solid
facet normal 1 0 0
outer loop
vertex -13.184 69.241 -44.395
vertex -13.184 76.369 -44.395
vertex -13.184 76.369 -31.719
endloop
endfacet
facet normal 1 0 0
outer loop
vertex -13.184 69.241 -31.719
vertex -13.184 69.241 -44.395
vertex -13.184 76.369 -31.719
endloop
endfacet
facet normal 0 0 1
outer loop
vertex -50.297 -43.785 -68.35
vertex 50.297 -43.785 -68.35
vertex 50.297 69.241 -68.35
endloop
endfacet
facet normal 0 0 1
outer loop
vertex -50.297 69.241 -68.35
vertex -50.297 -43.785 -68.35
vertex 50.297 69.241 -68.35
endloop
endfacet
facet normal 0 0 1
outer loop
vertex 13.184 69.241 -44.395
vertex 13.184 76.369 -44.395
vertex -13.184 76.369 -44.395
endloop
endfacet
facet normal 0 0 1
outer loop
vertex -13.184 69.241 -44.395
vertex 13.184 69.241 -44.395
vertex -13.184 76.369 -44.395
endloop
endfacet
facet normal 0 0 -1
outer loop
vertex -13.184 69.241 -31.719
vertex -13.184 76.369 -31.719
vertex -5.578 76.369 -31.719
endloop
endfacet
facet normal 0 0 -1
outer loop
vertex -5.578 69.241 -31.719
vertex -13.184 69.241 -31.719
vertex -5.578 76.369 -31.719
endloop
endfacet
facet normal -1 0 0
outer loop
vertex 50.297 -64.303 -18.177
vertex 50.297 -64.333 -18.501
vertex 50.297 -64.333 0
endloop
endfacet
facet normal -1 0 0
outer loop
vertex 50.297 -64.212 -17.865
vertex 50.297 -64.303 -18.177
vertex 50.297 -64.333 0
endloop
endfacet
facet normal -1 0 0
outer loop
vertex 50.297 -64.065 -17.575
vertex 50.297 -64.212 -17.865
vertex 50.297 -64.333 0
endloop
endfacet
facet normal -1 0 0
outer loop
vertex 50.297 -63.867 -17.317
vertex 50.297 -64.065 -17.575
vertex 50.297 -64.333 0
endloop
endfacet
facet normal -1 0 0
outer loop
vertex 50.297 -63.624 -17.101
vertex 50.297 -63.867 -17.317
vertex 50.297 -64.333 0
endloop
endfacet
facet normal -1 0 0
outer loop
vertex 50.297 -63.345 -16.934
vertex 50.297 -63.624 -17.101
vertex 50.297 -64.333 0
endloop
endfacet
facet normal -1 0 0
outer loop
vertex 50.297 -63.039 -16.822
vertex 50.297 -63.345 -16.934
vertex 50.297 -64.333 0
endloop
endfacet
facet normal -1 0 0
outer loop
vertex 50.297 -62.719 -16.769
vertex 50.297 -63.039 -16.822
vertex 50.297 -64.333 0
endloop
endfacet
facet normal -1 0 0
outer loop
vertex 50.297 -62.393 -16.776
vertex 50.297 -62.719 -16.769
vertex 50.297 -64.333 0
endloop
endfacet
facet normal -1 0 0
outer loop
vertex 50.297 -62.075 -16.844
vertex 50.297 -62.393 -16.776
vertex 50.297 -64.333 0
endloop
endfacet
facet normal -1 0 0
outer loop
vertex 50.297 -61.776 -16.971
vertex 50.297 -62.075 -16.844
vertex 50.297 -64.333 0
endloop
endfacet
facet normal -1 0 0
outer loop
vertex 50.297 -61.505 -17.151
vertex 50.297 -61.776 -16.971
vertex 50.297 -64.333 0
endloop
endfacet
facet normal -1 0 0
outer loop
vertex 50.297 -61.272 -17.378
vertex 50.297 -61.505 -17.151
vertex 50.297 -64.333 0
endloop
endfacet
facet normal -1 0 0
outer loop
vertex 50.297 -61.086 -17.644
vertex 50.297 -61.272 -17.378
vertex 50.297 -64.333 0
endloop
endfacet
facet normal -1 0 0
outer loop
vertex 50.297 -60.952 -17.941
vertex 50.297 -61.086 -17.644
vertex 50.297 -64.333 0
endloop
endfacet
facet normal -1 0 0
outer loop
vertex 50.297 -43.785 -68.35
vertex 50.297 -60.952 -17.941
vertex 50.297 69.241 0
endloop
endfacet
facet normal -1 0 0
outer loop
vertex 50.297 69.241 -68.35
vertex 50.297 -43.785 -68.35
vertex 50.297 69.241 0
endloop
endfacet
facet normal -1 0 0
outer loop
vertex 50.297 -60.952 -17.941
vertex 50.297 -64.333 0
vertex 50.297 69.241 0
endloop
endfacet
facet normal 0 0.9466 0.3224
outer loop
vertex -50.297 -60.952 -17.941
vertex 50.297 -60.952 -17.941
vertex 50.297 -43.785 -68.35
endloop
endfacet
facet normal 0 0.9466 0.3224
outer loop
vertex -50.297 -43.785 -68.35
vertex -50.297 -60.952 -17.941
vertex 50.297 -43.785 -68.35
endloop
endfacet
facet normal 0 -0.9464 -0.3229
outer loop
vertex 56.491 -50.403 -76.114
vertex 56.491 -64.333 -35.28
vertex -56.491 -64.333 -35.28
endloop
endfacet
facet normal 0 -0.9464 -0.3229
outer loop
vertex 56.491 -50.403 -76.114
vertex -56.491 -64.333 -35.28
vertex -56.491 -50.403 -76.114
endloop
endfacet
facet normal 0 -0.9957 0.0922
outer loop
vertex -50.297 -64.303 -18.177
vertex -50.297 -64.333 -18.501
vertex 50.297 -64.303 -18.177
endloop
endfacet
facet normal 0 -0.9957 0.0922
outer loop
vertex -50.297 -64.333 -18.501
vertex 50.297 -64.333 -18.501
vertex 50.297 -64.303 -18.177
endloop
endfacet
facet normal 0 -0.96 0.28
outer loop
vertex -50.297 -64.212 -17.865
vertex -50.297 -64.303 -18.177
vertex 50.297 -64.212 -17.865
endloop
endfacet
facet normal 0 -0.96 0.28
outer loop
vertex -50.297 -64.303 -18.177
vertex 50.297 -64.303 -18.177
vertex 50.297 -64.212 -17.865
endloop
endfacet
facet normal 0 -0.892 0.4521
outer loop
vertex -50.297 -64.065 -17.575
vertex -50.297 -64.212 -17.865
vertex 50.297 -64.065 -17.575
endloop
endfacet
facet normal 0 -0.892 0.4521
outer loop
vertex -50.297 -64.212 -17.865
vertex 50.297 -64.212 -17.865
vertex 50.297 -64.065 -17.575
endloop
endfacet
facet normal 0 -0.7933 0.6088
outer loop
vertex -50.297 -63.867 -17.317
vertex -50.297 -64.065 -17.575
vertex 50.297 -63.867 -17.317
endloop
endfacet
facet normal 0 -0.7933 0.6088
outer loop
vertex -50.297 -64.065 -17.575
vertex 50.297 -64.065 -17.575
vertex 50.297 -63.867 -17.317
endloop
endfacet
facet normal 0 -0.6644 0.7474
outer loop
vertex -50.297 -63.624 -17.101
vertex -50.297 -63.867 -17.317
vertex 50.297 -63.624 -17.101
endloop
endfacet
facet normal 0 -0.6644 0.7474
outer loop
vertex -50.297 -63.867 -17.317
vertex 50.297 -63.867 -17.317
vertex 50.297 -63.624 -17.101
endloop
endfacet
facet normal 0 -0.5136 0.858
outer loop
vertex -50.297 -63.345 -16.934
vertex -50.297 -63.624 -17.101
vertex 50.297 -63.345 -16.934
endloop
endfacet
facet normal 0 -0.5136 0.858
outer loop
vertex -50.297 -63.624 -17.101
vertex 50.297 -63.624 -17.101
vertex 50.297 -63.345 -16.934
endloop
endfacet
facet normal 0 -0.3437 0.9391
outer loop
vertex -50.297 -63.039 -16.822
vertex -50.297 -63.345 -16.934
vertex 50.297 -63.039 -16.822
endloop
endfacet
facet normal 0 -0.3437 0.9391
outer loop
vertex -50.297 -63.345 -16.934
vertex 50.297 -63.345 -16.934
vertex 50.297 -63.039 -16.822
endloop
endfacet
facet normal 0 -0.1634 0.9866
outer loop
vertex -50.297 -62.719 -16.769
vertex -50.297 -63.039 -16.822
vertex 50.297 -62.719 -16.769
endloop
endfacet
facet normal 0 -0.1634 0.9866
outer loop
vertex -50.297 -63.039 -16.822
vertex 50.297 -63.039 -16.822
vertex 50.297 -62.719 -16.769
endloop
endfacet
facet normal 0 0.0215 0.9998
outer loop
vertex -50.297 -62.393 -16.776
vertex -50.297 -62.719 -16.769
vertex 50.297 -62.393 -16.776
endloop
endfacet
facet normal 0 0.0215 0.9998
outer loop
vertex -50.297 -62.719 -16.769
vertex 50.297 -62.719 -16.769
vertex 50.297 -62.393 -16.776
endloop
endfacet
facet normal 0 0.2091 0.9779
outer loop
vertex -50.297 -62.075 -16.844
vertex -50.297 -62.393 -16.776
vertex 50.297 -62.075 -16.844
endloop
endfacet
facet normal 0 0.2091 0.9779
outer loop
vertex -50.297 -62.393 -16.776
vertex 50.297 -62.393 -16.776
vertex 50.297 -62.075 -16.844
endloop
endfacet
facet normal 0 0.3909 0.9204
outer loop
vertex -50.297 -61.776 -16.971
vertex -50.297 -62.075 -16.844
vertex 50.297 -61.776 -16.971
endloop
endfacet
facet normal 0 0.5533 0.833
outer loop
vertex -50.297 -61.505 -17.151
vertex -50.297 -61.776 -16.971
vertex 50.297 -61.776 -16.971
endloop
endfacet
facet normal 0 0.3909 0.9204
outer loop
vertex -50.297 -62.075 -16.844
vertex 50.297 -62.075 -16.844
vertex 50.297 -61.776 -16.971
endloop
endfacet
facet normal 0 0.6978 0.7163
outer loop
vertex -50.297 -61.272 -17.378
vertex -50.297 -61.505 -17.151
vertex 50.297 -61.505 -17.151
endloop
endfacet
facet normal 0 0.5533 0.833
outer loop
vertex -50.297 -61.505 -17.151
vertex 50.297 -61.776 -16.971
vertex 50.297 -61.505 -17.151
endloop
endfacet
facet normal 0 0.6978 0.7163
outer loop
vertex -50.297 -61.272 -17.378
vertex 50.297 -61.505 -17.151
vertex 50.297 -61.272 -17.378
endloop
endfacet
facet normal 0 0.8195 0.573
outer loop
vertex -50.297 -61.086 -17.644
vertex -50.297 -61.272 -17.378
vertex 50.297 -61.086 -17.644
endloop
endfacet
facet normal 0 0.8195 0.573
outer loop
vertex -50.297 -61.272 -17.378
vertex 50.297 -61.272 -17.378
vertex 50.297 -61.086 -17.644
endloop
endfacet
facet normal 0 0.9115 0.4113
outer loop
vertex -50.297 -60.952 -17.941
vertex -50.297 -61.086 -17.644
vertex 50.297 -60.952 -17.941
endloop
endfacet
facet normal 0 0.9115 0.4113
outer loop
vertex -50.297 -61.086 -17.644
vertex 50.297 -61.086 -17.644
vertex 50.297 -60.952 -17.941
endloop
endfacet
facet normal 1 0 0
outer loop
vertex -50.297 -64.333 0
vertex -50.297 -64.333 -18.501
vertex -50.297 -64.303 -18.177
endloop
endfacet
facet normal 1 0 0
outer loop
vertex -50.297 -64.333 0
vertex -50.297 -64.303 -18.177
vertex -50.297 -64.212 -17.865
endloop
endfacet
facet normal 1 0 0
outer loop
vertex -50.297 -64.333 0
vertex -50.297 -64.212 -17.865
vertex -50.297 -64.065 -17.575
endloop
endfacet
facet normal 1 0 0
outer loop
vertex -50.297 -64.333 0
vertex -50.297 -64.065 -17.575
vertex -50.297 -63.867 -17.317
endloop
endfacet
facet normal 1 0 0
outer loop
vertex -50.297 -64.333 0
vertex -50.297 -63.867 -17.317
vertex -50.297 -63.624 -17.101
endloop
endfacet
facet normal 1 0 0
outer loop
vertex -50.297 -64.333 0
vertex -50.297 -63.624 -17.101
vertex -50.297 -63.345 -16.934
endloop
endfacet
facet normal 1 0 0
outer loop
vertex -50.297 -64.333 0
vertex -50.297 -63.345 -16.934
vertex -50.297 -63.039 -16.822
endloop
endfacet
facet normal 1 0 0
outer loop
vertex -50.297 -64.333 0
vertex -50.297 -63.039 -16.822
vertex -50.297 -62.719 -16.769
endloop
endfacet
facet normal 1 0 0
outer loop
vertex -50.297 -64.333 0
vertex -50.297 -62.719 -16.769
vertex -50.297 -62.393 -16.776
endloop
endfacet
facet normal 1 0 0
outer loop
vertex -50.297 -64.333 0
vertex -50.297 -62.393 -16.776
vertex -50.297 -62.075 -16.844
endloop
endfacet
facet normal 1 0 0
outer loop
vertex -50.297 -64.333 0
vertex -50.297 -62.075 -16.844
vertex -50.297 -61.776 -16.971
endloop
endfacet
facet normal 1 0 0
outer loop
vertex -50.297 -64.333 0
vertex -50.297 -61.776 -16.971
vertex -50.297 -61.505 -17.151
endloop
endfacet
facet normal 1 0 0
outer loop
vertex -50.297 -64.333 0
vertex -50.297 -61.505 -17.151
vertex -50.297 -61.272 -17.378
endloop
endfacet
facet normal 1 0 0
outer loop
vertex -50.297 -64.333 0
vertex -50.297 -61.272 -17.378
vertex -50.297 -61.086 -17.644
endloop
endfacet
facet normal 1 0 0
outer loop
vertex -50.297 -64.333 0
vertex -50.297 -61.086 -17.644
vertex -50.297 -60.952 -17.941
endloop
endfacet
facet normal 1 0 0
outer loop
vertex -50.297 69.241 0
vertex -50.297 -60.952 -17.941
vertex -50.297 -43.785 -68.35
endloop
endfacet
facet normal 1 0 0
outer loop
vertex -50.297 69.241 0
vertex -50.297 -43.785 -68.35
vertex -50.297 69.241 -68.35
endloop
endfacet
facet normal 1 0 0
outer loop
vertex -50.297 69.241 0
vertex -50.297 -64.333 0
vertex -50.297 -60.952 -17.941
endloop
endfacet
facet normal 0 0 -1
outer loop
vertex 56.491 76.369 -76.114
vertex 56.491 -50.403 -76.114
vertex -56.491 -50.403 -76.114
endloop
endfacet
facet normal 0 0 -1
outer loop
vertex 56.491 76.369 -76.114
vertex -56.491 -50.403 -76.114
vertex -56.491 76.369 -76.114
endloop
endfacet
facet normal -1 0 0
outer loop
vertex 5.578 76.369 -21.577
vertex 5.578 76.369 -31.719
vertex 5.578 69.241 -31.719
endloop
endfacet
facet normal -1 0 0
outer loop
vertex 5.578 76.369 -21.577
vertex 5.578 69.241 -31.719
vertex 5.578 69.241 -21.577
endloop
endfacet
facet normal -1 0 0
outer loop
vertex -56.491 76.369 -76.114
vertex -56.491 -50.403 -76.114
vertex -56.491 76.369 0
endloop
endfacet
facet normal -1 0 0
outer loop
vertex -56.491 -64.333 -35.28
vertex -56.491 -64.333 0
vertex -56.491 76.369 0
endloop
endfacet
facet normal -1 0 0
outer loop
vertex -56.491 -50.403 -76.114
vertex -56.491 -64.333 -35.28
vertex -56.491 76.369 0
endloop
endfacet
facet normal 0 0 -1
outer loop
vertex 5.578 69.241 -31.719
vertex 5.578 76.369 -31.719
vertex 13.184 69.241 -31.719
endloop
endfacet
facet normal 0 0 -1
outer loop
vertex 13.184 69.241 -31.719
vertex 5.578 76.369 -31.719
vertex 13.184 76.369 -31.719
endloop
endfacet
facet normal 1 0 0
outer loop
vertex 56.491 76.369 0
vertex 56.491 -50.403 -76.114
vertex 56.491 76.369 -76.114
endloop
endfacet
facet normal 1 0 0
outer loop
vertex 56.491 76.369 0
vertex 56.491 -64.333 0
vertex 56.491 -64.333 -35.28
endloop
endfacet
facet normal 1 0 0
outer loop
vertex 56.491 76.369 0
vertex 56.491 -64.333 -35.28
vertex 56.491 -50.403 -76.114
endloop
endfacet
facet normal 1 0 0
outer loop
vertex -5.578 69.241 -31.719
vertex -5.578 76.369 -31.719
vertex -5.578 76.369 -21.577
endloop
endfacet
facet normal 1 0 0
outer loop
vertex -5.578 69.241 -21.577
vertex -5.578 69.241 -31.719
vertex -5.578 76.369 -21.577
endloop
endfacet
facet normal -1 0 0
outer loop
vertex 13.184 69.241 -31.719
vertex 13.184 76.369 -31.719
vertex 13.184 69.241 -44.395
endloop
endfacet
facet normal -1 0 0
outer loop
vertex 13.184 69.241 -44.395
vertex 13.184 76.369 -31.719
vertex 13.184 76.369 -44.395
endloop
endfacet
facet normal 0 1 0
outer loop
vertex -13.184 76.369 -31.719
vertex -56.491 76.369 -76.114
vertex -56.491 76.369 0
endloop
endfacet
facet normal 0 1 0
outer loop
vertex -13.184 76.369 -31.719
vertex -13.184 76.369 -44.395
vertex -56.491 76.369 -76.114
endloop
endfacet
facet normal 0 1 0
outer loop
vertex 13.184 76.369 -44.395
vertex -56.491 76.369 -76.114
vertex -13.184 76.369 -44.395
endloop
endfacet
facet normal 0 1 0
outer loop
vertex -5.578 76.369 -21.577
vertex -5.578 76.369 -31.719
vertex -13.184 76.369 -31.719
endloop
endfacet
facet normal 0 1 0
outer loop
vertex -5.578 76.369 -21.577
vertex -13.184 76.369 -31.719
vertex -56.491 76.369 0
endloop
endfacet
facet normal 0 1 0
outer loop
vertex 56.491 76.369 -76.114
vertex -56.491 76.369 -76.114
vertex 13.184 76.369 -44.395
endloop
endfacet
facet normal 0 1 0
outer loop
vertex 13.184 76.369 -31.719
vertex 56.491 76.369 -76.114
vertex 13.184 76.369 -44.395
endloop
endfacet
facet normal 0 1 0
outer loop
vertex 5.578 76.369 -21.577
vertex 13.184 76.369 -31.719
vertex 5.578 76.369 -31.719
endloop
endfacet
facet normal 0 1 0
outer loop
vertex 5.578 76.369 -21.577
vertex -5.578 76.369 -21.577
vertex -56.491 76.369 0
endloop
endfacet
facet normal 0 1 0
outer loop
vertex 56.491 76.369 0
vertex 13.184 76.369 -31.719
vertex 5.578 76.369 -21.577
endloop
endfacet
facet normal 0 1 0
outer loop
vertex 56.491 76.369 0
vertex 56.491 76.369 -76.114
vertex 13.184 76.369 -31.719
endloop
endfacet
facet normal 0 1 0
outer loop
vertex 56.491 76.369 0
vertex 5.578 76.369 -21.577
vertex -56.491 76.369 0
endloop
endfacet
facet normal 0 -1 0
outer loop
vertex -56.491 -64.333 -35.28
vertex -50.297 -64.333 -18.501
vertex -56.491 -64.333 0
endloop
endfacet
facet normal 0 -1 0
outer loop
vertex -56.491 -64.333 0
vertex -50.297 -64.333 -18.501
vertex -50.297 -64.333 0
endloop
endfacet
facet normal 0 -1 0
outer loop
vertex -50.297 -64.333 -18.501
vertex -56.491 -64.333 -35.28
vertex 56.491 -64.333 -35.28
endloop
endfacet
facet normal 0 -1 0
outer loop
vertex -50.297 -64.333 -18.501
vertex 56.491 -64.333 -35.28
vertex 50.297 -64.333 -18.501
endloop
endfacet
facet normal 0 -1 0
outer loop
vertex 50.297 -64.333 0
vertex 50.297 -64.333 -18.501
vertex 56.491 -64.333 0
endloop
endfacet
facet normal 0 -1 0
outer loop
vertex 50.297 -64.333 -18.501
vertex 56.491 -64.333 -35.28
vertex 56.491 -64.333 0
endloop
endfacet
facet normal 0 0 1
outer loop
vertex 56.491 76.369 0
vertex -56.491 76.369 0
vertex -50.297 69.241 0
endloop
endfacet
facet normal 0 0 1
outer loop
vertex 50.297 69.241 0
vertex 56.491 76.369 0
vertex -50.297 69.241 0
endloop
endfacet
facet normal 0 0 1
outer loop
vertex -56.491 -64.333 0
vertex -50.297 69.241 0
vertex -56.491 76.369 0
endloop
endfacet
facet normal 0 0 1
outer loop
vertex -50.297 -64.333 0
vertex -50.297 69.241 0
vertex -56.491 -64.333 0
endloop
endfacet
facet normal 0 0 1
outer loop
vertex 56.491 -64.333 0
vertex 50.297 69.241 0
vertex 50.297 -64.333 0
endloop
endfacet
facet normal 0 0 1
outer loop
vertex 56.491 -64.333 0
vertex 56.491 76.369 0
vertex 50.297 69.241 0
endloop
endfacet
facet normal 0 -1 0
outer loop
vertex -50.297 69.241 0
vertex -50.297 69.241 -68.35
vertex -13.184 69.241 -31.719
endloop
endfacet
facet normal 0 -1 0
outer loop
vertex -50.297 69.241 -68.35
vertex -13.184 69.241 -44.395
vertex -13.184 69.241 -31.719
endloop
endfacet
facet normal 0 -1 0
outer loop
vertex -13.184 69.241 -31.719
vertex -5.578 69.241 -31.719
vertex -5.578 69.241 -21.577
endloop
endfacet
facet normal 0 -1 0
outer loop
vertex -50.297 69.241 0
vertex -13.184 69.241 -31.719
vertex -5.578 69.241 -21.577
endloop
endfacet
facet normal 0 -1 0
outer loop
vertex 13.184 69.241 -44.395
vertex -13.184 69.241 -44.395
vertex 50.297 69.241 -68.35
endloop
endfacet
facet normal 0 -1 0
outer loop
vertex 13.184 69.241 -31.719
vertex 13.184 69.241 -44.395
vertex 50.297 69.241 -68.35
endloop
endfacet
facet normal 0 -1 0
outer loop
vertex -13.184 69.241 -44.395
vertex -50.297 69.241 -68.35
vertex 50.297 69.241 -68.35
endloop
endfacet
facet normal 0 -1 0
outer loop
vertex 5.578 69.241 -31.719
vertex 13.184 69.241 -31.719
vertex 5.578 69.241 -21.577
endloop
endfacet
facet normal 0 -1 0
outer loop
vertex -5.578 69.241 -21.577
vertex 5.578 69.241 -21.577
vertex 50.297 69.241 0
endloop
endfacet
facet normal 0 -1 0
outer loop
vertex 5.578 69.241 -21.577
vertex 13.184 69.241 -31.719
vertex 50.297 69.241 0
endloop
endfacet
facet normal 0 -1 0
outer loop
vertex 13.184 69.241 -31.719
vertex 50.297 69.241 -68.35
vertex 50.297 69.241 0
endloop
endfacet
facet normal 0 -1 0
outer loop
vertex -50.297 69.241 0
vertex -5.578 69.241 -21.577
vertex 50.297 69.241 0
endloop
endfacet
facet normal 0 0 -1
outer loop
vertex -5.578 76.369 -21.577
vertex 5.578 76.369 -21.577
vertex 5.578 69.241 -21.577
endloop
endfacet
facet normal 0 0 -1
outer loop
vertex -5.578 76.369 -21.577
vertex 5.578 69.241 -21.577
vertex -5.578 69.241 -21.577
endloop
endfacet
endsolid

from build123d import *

# Parameters (mm, degrees)
F2_DEPTH  = 56.49083
F3_DEPTH  = 50.29662
F4_W      = 17.6400020719
F4_H      = 34.6500007436
F5_DEPTH  = 152.4
F6_W      = 8.1899985671
F6_H      = 40.634999983
F7_DEPTH  = 152.4
F8_R      = 1.7367288427
F9_W      = 11.1553873867
F9_H      = 10.141255334
F10_DEPTH = 26.2403


with BuildPart() as f2:
    # F0 (on Right) → F2 (new body, symmetric)
    with BuildSketch(Plane.YZ):
        Polygon((76.3685554266, 0), (-76.3685554266, 0), (-50.4032447934, -76.1139914393), (76.3685554266, -76.1139914393), align=None)
    extrude(amount=F2_DEPTH, both=True)

    # F1 (on face) → F3 (cut, symmetric)
    with BuildSketch(Plane.YZ):
        Polygon((69.2408159375, 0), (-67.0627951622, 0), (-43.7846407294, -68.349853158), (69.2408159375, -68.349853158), align=None)
    extrude(amount=F3_DEPTH, both=True, mode=Mode.SUBTRACT)

    # F4 (on Right) → F5 (cut, symmetric)
    with BuildSketch(Plane.YZ):
        with Locations((-75.7574997842, -6.6150003113)):
            Rectangle(F4_W, F4_H)
    extrude(amount=F5_DEPTH, both=True, mode=Mode.SUBTRACT)

    # F6 (on Right) → F7 (cut, symmetric)
    with BuildSketch(Plane.YZ):
        with Locations((-68.42822209, -15.2774997987)):
            Rectangle(F6_W, F6_H)
    extrude(amount=F7_DEPTH, both=True, mode=Mode.SUBTRACT)

    # F8
    f8_edges = [f2.edges().sort_by_distance(p)[0] for p in [
        (0, -64.333223, -8.014633),
    ]]
    fillet(f8_edges, radius=F8_R)

    # F9 (on face) → F10 (cut)
    with BuildSketch(Plane(origin=(0, 76.3685554266, 0), x_dir=(-1, 0, 0), z_dir=(0, 1, 0))):
        Polygon((-5.5776936933, -31.7187085748), (-13.1836356595, -31.7187085748), (-13.1836356595, -44.3952828646), (13.1836356595, -44.3952828646), (13.1836356595, -31.7187085748), (5.5776936933, -31.7187085748), (5.5776936933, -41.8599639088), (-5.5776936933, -41.8599639088), align=None)
        with Locations((0, -26.6480809078)):
            Rectangle(F9_W, F9_H)
        with Locations((0, -36.7893362418)):
            Rectangle(F9_W, F9_H)
    extrude(amount=-F10_DEPTH, mode=Mode.SUBTRACT)


solid = f2.part
